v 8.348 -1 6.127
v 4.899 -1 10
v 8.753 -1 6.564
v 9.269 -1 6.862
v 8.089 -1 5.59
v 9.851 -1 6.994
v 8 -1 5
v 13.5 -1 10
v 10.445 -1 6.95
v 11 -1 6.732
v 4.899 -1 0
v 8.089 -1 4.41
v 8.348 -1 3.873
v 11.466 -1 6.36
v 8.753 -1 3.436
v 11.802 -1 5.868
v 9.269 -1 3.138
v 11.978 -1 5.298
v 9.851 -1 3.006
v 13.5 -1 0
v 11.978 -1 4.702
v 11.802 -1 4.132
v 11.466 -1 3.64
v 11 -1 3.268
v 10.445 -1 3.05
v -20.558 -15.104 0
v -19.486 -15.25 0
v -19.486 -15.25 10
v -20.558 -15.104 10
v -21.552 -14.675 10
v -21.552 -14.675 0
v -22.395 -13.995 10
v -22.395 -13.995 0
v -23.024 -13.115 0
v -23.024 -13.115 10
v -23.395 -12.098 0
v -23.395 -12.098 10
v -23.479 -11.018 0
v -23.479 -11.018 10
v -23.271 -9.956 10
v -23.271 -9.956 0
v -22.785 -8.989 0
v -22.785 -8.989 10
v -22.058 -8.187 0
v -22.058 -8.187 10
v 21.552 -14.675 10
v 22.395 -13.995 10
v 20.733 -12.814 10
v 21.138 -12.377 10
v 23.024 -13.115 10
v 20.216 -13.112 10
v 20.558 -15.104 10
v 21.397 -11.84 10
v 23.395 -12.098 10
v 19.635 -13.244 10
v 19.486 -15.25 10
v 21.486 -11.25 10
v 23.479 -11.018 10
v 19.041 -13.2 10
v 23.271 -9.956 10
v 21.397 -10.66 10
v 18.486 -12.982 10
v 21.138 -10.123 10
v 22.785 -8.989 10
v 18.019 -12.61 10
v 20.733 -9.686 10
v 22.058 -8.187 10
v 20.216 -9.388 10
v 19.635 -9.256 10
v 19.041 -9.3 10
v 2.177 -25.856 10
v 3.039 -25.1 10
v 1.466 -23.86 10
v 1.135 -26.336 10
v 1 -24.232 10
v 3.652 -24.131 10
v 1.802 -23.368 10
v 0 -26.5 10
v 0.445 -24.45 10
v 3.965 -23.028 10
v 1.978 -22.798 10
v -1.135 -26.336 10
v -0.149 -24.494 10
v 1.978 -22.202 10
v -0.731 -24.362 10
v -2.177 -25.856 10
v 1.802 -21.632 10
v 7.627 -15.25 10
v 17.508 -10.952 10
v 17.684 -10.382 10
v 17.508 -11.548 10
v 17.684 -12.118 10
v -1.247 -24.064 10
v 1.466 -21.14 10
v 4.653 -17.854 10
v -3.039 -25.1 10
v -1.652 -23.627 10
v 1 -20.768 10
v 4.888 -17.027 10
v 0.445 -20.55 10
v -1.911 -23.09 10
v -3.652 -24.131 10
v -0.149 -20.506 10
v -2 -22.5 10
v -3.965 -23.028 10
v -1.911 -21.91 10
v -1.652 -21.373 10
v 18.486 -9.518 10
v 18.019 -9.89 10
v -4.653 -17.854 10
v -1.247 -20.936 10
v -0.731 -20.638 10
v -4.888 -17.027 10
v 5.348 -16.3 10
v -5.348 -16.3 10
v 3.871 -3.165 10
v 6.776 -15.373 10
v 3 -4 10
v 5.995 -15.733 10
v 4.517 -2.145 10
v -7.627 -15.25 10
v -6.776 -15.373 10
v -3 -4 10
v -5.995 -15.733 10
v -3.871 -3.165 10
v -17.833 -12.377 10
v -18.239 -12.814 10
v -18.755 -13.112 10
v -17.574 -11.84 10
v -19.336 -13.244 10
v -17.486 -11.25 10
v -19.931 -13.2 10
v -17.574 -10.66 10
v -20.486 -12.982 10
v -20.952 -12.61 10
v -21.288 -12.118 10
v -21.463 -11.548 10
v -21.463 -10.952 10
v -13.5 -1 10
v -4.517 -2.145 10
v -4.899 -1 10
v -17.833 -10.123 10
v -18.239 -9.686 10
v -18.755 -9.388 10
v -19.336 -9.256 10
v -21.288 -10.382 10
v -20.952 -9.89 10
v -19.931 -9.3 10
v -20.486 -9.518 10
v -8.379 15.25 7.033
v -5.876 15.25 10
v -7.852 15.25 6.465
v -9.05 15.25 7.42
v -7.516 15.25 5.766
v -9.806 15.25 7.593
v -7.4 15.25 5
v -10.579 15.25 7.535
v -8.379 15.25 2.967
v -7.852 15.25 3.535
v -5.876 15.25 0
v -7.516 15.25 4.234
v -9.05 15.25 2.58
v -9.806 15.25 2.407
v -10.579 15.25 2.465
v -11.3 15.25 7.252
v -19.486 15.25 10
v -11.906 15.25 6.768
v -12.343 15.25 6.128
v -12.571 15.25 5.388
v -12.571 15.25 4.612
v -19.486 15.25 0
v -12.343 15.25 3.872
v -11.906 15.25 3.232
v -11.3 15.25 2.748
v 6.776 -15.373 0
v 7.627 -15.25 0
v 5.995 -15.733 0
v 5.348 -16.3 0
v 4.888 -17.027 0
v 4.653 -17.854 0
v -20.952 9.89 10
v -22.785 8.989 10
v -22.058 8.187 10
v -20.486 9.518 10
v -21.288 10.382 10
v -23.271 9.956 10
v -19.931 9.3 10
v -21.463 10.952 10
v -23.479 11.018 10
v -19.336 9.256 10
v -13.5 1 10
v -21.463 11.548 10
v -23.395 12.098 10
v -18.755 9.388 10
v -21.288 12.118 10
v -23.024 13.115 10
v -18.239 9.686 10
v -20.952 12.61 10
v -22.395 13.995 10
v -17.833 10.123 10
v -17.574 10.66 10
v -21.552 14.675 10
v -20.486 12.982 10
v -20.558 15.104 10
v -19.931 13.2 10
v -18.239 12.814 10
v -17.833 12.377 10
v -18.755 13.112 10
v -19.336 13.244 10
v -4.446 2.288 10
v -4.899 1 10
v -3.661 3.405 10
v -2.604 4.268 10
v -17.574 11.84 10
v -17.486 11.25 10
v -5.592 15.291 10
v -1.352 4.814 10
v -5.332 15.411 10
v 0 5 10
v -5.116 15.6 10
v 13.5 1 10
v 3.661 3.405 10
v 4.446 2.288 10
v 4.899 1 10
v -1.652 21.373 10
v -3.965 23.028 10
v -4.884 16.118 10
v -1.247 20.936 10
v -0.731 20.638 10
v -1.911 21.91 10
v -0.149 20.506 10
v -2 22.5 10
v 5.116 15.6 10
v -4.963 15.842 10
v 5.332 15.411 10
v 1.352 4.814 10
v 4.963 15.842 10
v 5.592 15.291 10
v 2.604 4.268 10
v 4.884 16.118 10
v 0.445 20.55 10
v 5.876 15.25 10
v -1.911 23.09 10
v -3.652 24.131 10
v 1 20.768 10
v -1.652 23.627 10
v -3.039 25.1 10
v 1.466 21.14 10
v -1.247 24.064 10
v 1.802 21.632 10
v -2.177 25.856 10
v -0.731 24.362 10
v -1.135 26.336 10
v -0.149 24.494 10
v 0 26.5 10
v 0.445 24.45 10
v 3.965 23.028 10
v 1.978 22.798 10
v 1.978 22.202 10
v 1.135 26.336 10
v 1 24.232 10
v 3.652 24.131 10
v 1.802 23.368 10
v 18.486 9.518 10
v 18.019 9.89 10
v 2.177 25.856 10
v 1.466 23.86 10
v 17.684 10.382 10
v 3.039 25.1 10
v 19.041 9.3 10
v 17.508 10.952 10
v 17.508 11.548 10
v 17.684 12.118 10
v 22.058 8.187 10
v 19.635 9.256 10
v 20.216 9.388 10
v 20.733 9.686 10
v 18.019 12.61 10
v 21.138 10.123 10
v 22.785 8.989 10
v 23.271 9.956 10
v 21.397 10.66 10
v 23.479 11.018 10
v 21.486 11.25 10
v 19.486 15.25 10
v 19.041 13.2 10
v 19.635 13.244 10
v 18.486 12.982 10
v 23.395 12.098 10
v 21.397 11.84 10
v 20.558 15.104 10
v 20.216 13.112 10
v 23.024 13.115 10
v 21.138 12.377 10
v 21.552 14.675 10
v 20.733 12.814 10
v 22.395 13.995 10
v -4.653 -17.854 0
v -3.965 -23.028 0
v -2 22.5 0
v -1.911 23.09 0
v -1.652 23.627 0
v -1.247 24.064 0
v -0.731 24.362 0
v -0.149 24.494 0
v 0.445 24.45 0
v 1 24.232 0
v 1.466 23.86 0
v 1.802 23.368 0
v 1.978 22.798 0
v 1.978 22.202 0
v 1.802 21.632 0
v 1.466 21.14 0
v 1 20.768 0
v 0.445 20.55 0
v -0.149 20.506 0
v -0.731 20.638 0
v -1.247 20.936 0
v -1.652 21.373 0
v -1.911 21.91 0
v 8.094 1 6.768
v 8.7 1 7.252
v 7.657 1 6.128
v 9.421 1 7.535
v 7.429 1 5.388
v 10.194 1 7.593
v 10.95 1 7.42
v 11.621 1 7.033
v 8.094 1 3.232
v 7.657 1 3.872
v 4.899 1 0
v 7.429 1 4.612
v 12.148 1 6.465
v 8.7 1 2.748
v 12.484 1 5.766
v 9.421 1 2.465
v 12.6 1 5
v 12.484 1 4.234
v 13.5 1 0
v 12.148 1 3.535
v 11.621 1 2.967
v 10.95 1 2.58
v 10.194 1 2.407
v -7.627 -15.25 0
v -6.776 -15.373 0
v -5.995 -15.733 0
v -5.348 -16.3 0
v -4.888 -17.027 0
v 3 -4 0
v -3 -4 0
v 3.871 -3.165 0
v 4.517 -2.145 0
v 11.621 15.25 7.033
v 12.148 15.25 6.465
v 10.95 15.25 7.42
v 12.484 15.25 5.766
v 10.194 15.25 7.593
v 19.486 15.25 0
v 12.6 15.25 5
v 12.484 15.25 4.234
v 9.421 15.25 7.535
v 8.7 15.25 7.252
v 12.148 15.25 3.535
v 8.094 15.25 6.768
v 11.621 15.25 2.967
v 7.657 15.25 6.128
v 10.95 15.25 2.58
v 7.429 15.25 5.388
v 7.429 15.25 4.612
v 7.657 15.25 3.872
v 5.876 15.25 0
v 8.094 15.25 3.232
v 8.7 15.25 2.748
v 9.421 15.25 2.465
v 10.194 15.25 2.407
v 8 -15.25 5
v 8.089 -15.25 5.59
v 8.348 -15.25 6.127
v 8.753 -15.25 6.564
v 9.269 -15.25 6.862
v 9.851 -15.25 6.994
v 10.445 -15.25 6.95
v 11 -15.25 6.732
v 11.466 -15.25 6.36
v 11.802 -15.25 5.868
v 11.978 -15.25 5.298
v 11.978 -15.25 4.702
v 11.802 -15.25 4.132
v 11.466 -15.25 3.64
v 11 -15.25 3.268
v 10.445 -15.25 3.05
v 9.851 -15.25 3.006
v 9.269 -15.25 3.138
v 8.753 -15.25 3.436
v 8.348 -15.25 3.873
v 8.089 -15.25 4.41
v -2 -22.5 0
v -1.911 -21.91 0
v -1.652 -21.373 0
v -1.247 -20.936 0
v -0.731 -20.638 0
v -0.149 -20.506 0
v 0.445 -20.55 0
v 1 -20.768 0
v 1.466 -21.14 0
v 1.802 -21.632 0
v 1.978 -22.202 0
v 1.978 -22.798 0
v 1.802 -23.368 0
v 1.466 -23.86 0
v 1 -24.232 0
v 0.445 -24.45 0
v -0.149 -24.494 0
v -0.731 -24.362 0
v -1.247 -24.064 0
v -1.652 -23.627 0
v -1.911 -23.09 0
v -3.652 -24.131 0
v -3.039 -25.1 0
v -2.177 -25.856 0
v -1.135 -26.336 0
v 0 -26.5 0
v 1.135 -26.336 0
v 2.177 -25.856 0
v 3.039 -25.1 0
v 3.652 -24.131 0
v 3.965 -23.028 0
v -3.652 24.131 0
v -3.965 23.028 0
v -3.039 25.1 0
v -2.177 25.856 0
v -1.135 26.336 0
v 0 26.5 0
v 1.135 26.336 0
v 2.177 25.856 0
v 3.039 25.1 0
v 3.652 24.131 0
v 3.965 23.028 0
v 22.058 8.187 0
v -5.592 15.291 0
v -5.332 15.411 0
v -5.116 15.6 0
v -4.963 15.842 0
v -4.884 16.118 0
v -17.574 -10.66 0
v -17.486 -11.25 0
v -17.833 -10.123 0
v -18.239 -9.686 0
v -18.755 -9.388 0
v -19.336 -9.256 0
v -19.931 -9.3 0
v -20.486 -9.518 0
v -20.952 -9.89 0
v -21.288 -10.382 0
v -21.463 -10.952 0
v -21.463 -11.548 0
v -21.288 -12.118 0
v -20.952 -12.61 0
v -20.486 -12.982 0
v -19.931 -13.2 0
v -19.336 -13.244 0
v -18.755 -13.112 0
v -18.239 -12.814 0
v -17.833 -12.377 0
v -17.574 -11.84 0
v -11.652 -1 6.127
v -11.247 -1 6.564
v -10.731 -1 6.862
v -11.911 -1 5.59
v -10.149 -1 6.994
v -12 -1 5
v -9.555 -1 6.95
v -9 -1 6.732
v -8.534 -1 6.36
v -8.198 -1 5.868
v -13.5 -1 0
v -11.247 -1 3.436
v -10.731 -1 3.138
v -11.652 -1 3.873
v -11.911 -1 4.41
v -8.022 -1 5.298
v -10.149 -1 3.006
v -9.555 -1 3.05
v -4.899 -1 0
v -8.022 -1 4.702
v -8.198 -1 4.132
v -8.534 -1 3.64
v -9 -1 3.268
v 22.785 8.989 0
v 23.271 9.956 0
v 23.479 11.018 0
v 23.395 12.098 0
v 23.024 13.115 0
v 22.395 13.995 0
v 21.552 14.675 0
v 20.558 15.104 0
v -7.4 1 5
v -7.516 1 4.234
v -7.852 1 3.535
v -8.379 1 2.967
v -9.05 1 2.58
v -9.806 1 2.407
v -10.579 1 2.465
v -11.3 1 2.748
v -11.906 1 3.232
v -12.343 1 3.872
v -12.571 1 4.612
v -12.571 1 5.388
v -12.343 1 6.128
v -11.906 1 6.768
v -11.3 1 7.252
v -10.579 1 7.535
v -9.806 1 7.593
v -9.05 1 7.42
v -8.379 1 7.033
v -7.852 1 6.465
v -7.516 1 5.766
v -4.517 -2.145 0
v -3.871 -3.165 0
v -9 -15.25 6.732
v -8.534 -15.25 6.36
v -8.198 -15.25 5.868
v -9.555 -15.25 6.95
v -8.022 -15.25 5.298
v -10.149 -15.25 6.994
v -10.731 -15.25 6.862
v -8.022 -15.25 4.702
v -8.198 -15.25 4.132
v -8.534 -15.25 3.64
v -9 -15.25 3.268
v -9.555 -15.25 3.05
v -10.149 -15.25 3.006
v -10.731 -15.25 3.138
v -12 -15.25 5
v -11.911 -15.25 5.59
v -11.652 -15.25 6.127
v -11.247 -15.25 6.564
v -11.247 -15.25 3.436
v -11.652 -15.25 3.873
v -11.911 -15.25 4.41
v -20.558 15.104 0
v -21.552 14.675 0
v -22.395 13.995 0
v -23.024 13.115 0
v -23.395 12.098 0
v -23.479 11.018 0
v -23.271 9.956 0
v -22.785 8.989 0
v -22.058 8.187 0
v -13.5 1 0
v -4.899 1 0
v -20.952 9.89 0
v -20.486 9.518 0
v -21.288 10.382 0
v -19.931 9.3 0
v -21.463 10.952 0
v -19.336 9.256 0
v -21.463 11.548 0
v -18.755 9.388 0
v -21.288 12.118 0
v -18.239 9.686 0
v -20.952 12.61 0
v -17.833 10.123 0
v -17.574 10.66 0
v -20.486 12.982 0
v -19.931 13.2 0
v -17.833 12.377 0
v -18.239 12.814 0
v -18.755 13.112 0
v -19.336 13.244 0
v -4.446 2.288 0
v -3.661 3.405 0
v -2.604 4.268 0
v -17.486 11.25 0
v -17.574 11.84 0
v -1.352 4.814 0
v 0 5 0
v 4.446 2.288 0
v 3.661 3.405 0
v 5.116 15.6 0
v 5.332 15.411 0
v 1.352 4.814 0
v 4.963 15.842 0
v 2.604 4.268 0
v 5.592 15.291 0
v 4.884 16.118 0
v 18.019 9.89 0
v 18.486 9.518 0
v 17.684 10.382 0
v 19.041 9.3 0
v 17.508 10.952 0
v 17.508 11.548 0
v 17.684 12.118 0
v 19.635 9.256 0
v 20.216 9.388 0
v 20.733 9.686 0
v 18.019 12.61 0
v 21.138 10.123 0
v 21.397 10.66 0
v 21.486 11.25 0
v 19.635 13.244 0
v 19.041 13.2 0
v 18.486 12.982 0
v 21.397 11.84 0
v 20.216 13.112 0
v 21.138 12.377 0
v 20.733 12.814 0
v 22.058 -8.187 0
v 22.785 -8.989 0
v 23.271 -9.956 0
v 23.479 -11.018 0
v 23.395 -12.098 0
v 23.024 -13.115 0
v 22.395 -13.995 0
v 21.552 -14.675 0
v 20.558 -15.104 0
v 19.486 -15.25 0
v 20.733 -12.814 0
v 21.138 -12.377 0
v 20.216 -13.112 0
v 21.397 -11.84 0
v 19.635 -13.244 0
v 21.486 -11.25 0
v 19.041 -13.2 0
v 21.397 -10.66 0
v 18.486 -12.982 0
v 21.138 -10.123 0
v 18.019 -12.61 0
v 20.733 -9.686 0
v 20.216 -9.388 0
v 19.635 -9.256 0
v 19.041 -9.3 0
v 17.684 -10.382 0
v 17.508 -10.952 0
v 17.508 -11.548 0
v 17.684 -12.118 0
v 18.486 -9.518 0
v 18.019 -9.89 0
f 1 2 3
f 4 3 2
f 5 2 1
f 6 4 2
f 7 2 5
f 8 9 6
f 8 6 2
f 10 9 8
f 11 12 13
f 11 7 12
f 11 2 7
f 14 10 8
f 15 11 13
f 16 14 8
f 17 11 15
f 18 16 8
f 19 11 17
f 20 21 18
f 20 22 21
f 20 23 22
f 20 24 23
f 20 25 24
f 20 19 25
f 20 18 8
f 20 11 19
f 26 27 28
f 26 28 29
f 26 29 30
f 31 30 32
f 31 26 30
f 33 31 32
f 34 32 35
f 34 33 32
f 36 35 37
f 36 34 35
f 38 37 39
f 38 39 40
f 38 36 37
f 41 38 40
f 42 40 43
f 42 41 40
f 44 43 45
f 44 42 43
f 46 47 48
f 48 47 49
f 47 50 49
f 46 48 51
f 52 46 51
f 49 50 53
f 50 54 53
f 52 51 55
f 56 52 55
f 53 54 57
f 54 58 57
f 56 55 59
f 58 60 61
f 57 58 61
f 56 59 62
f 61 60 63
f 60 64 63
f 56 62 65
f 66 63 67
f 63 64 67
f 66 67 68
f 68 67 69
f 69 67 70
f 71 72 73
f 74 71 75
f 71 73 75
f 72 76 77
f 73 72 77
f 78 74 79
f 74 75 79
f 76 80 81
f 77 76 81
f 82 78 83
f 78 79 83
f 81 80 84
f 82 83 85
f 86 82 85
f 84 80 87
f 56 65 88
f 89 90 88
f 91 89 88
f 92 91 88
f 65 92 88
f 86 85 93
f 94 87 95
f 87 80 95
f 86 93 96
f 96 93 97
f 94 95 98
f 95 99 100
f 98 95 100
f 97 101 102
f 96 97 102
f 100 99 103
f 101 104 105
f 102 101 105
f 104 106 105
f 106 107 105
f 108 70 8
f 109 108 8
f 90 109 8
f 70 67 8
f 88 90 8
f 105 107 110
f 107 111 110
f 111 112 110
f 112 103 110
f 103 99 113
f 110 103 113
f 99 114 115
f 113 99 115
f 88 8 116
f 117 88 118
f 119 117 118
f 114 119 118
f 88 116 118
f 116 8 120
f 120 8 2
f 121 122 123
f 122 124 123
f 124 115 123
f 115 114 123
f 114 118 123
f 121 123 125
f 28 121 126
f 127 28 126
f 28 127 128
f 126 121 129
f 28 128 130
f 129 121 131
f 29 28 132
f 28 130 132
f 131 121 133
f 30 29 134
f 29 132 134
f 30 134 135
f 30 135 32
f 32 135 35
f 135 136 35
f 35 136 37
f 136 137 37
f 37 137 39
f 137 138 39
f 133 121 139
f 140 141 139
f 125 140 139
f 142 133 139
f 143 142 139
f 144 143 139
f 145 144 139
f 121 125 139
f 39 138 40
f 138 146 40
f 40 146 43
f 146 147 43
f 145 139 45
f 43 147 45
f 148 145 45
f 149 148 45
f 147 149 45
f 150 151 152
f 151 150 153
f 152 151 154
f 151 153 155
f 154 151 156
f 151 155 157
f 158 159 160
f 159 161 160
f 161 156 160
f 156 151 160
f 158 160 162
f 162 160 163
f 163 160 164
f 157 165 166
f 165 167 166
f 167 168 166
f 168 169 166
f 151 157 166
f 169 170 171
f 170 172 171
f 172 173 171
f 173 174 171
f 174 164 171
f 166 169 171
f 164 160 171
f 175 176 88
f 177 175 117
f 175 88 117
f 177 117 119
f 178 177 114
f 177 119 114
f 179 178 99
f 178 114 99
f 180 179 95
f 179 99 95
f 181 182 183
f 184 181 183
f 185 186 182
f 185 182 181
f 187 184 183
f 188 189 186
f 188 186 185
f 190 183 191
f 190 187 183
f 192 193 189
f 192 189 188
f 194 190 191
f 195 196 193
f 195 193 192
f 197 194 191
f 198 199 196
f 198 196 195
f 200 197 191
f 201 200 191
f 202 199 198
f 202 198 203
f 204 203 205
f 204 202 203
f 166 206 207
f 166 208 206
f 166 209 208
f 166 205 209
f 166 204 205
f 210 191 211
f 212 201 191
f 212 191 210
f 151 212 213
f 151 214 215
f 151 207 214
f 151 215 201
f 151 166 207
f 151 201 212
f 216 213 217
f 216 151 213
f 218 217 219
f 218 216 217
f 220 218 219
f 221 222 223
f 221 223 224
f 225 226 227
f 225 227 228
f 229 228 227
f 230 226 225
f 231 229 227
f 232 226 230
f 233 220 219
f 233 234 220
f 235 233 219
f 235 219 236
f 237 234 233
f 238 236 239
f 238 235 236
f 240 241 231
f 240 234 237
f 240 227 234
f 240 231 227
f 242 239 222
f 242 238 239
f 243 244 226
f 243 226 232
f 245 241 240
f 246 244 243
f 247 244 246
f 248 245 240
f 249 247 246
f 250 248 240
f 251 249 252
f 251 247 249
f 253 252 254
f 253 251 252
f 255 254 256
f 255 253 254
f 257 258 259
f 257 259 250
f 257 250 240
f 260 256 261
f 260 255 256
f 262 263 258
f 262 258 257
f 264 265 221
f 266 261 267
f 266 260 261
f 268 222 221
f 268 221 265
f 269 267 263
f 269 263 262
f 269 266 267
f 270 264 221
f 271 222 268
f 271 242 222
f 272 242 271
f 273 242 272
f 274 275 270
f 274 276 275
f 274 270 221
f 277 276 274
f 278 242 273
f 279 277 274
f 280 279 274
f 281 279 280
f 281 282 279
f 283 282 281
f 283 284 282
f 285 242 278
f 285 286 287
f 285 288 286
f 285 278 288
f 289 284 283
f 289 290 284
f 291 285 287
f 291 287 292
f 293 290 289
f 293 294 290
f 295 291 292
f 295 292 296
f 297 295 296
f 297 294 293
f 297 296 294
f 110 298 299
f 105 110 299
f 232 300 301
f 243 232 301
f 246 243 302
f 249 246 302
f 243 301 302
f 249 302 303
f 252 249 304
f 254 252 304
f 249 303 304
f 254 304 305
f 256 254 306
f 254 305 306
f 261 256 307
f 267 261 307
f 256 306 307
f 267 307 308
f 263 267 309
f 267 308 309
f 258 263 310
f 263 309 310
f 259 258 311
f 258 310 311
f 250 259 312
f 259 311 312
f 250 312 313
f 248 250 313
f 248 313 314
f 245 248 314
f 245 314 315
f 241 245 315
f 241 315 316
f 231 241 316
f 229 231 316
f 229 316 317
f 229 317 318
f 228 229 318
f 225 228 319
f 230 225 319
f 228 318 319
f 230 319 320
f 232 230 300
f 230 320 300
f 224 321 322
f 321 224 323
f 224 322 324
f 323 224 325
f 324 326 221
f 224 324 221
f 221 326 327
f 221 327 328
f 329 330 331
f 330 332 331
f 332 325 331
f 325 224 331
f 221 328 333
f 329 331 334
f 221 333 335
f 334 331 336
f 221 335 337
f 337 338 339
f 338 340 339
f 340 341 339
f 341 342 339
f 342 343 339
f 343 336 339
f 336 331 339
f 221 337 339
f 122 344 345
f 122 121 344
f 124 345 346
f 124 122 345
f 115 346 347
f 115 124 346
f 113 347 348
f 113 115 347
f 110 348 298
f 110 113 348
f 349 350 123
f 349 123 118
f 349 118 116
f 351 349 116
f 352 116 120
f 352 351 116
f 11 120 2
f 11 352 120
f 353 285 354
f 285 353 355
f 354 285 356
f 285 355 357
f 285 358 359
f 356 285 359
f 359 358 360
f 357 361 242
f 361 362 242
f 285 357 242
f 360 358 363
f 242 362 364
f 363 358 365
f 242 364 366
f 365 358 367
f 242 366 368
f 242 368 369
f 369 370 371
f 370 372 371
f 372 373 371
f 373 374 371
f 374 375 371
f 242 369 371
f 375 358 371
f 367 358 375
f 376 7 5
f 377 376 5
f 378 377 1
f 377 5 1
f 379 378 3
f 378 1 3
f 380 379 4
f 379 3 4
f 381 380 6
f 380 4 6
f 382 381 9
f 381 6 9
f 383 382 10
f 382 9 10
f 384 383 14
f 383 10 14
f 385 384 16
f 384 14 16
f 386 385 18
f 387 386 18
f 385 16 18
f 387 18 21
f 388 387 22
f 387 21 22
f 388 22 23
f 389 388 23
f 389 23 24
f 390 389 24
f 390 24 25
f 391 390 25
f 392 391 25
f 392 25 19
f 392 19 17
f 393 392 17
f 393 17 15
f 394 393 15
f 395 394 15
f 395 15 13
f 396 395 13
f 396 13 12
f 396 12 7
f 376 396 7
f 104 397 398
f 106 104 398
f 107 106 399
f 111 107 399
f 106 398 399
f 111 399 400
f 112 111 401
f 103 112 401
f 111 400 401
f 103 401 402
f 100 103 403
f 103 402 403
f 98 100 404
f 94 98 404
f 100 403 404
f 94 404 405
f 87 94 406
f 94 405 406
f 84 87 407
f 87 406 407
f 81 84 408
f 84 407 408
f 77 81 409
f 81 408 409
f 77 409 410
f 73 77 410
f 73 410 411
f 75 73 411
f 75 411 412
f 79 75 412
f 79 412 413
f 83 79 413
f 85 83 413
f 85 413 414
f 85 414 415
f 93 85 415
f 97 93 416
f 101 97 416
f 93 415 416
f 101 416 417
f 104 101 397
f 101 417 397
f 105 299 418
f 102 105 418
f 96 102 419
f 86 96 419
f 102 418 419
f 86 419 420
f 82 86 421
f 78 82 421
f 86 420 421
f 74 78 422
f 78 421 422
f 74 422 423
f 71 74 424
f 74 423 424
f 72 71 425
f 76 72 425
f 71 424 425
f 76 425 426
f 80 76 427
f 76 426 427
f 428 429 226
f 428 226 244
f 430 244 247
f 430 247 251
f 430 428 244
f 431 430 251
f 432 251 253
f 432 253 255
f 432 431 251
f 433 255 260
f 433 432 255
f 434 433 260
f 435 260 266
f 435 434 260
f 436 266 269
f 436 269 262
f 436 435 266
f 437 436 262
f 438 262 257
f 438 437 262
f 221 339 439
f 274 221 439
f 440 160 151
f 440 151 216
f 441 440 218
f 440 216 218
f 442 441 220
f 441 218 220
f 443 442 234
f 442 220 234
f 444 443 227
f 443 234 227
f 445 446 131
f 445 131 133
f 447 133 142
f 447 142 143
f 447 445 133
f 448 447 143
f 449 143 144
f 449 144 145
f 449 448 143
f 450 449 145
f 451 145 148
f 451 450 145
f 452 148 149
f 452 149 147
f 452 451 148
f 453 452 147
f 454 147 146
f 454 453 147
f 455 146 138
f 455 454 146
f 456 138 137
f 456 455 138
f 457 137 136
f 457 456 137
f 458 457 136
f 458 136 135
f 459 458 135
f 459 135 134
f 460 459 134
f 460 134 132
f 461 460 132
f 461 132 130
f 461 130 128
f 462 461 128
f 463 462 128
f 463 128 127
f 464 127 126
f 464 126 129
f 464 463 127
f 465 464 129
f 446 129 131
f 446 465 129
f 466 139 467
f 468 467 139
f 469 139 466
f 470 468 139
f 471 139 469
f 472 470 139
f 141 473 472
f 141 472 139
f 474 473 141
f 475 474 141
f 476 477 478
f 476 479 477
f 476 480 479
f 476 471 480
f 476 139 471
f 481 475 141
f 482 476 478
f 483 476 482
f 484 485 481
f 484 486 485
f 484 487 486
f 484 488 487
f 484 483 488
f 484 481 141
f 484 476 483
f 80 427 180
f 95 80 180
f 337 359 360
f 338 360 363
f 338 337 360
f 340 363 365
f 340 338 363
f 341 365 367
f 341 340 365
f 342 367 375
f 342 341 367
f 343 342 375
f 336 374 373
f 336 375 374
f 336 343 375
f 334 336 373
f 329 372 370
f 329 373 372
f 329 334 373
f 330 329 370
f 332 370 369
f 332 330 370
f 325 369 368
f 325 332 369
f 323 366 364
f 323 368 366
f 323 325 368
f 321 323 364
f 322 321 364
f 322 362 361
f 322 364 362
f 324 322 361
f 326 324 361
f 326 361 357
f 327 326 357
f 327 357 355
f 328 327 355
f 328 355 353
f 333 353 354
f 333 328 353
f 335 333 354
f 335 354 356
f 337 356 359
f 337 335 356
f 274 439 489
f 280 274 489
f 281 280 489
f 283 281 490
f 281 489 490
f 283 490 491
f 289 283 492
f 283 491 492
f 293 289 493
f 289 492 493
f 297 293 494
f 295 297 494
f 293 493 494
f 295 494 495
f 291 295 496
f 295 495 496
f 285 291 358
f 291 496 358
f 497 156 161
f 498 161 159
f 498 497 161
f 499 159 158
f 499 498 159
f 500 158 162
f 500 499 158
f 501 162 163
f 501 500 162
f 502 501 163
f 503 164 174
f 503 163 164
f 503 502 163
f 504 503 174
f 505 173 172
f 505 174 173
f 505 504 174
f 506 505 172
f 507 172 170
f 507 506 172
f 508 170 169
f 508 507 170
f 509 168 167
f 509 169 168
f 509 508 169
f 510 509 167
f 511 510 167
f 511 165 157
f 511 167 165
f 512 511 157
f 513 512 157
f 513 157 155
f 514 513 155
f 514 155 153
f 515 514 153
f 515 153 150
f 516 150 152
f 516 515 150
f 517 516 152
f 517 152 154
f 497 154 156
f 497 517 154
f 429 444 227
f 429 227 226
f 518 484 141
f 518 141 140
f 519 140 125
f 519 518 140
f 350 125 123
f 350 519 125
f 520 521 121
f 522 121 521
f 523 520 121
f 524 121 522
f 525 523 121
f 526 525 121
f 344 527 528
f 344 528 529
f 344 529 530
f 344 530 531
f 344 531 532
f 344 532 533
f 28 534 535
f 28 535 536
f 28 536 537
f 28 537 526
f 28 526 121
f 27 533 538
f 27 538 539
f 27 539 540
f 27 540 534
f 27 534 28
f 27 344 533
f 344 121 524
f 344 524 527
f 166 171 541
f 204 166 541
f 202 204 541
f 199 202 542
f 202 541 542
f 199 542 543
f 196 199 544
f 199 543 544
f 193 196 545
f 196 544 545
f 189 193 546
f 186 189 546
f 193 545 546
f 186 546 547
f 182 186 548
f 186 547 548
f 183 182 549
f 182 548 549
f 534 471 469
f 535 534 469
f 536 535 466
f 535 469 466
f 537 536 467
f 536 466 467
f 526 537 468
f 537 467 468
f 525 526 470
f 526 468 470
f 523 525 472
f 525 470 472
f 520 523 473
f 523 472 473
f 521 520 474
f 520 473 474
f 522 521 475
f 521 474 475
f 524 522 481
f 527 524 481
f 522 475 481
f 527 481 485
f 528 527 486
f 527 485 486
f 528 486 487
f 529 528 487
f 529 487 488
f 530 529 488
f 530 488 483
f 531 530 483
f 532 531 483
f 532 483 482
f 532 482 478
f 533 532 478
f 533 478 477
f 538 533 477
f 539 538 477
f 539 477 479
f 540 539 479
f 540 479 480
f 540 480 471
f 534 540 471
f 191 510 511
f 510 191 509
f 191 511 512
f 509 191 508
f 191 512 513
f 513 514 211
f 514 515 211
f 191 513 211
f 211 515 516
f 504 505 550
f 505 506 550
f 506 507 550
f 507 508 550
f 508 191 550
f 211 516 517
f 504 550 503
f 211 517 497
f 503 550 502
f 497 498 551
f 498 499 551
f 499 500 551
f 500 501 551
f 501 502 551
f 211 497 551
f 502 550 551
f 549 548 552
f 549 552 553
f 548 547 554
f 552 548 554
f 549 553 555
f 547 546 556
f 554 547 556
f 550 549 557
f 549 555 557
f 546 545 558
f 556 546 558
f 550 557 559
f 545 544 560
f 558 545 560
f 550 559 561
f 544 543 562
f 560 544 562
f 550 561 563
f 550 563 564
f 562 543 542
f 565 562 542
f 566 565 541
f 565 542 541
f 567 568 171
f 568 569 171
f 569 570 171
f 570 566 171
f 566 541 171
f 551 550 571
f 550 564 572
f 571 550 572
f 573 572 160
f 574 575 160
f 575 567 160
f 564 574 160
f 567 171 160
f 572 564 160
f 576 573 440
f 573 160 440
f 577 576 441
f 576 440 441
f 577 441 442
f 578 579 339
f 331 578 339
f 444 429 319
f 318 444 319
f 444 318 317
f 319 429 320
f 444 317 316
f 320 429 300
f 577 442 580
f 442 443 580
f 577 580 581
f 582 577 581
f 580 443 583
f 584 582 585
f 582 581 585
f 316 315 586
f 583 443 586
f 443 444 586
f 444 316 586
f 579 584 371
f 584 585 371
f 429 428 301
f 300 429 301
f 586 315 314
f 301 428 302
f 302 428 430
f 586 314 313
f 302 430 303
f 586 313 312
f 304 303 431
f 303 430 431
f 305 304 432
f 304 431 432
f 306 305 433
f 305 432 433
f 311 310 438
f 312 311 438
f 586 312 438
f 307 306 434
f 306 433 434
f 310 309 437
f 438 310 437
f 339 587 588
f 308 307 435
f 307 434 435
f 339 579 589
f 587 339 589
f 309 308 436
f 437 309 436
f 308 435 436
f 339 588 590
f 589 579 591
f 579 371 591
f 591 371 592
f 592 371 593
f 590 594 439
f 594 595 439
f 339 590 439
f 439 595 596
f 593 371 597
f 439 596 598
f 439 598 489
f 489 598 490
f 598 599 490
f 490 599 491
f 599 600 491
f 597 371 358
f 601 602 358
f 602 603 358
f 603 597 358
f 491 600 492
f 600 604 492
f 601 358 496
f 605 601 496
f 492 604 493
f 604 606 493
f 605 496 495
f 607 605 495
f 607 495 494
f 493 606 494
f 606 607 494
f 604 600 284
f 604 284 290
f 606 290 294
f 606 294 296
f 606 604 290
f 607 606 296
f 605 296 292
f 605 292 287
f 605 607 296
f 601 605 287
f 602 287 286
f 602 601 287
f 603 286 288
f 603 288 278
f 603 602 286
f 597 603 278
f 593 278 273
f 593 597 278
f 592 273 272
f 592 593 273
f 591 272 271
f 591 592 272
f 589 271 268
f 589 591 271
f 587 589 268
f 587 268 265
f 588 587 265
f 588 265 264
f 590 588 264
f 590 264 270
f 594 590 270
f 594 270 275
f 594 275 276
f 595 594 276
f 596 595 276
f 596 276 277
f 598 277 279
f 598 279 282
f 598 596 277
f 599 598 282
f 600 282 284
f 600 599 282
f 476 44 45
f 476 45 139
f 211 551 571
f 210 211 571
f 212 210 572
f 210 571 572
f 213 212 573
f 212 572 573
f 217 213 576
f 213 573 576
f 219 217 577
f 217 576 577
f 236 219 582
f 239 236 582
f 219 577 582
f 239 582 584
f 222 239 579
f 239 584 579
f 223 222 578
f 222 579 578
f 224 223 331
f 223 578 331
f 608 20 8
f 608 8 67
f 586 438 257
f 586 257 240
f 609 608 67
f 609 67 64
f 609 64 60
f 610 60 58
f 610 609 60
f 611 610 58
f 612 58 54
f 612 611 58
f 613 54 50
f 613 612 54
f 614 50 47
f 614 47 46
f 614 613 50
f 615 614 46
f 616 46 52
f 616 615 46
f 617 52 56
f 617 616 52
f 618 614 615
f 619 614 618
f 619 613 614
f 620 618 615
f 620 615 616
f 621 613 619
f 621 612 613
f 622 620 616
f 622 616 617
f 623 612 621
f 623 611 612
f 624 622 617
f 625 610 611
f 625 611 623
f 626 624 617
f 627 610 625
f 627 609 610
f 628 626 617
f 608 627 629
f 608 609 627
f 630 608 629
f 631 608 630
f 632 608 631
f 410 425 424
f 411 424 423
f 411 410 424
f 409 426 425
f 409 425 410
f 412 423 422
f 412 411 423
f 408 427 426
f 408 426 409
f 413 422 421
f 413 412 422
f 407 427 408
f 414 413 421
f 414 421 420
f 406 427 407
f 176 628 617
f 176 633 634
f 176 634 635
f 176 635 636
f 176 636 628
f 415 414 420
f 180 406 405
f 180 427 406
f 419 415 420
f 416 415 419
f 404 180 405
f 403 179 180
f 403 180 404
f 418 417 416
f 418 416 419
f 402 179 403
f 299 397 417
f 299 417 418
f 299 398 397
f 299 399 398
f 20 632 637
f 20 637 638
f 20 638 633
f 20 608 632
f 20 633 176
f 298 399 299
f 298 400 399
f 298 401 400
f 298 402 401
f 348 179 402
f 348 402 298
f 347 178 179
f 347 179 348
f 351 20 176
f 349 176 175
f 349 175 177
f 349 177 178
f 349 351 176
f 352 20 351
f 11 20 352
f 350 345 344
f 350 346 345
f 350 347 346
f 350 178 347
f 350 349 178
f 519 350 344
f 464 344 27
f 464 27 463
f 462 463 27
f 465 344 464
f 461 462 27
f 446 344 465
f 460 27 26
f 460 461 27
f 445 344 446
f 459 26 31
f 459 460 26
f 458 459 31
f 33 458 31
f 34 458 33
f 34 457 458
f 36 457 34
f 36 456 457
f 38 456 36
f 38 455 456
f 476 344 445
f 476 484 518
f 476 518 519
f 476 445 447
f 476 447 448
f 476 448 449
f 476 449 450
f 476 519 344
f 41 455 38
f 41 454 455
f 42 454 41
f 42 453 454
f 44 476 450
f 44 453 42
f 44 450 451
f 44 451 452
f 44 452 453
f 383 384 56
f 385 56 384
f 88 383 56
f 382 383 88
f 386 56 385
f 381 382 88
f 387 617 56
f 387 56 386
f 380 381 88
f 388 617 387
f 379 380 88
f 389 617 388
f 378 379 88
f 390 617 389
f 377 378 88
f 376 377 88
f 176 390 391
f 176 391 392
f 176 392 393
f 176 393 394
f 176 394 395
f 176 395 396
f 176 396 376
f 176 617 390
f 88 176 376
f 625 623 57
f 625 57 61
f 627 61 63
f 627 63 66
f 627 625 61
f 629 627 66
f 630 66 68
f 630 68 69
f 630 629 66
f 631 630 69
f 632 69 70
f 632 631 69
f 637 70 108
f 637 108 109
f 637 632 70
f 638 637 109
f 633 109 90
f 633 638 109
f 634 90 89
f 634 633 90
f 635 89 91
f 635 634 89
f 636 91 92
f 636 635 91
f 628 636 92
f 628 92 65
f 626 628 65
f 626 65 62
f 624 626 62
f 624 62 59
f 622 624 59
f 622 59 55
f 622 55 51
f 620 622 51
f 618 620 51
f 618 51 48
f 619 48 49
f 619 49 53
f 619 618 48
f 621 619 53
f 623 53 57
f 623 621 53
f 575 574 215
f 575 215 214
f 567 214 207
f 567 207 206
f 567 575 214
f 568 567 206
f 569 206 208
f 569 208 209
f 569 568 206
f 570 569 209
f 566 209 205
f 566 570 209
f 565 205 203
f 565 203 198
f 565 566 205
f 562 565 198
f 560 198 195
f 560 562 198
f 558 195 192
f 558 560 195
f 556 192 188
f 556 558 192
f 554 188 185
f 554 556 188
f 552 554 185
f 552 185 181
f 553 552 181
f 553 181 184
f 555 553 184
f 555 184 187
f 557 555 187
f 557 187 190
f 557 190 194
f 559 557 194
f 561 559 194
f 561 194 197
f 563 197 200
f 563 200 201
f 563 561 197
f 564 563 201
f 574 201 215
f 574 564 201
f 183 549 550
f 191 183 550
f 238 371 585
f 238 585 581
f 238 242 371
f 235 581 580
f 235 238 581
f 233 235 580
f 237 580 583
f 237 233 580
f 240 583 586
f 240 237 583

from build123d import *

# Parameters (mm, degrees)
SKETCH_1_R               = 2
EXTRUDE_1_DEPTH          = 10
EXTRUDE_1_2_DEPTH        = 10
CUT_EXTRUDE_2_DEPTH      = 40.772126831
CUT_EXTRUDE_2_DEPTH_BACK = 14.25
SKETCH_3_R               = 2.6
SKETCH_4_R               = 2
CUT_EXTRUDE_3_DEPTH      = 40.772126831
SKETCH_5_R               = 2
EXTRUDE_2_DEPTH          = 10
FILLET_1_R               = 3
FILLET_2_R               = 1


with BuildPart() as part:
    # 草图1 → 凸台-拉伸1 (new body)
    with BuildSketch(Plane.XY):
        with BuildLine():
            Line((-3, -4), (3, -4))
            ThreePointArc((3, -4), (4.224744871, -2.674234614), (4.898979486, -1))
            Line((4.898979486, -1), (13.5, -1))
            Line((13.5, -1), (22.057956933, -8.186858864))
            ThreePointArc((22.057956933, -8.186858864), (23.244066267, -12.618838094), (19.485571585, -15.25))
            Line((19.485571585, -15.25), (-19.485571585, -15.25))
            ThreePointArc((-19.485571585, -15.25), (-23.244066267, -12.618838094), (-22.057956933, -8.186858864))
            Line((-22.057956933, -8.186858864), (-13.5, -1))
            Line((-13.5, -1), (-4.898979486, -1))
            ThreePointArc((-4.898979486, -1), (-4.224744871, -2.674234614), (-3, -4))
        make_face()
        with Locations((19.485571585, -11.25)):
            Circle(SKETCH_1_R, mode=Mode.SUBTRACT)
        with Locations((-19.485571585, -11.25)):
            Circle(SKETCH_1_R, mode=Mode.SUBTRACT)
    extrude(amount=EXTRUDE_1_DEPTH)

    # 草图4 → 切除-拉伸3 (cut, through all)
    with BuildSketch(Plane(origin=(0, 15.25, 0), x_dir=(1, 0, 0), z_dir=(0, 1, 0))):
        with Locations(Location((10, -5, 0), (0, 0, 180))):
            Circle(SKETCH_4_R)
        with Locations(Location((-10, -5, 0), (0, 0, 180))):
            Circle(SKETCH_4_R)
    extrude(amount=-CUT_EXTRUDE_3_DEPTH, mode=Mode.SUBTRACT)



with BuildPart() as body_2:
    # 草图1 → Extrude 1 2 (new body)
    with BuildSketch(Plane.XY):
        with BuildLine():
            Line((-13.5, 1), (-4.898979486, 1))
            ThreePointArc((-4.898979486, 1), (0, 5), (4.898979486, 1))
            Line((4.898979486, 1), (13.5, 1))
            Line((13.5, 1), (22.057956933, 8.186858864))
            ThreePointArc((22.057956933, 8.186858864), (23.244066267, 12.618838094), (19.485571585, 15.25))
            Line((19.485571585, 15.25), (-19.485571585, 15.25))
            ThreePointArc((-19.485571585, 15.25), (-23.244066267, 12.618838094), (-22.057956933, 8.186858864))
            Line((-22.057956933, 8.186858864), (-13.5, 1))
        make_face()
        with Locations((19.485571585, 11.25)):
            Circle(SKETCH_1_R, mode=Mode.SUBTRACT)
        with Locations((-19.485571585, 11.25)):
            Circle(SKETCH_1_R, mode=Mode.SUBTRACT)
    extrude(amount=EXTRUDE_1_2_DEPTH)

    # 草图3 → 切除-拉伸2 (cut, two sides: drawn at the far end of the back side and taken through both)
    with BuildSketch(Plane(origin=(0, 15.25, 0), x_dir=(1, 0, 0), z_dir=(0, 1, 0)).offset(-CUT_EXTRUDE_2_DEPTH_BACK)):
        with Locations((10, -5)):
            Circle(SKETCH_3_R)
        with Locations((-10, -5)):
            Circle(SKETCH_3_R)
    extrude(amount=CUT_EXTRUDE_2_DEPTH + CUT_EXTRUDE_2_DEPTH_BACK, mode=Mode.SUBTRACT)


with BuildPart() as part_1:
    add(part.part)

    add(body_2.part)  # 凸台-拉伸2 merges body 2
    # 草图5 → 凸台-拉伸2 (add)
    # profile 1 of 2: a face of its own
    with BuildSketch(Plane(origin=(0, 0, 0), x_dir=(-1, 0, 0), z_dir=(0, 0, -1))):
        with BuildLine():
            Line((-3.965049412, -23.027620284), (-5, -15.25))
            Line((-5, -15.25), (5, -15.25))
            Line((5, -15.25), (3.965049412, -23.027620284))
            ThreePointArc((3.965049412, -23.027620284), (0, -26.5), (-3.965049412, -23.027620284))
        make_face()
        with Locations((0, -22.5)):
            Circle(SKETCH_5_R, mode=Mode.SUBTRACT)
    # profile 2 of 2: a face of its own
    with BuildSketch(Plane(origin=(0, 0, 0), x_dir=(-1, 0, 0), z_dir=(0, 0, -1))):
        with BuildLine():
            Line((5, 15.25), (3.965049412, 23.027620284))
            ThreePointArc((3.965049412, 23.027620284), (0, 26.5), (-3.965049412, 23.027620284))
            Line((-3.965049412, 23.027620284), (-5, 15.25))
            Line((-5, 15.25), (5, 15.25))
        make_face()
        with Locations((0, 22.5)):
            Circle(SKETCH_5_R, mode=Mode.SUBTRACT)
    extrude(amount=-EXTRUDE_2_DEPTH)

    # 圆角1
    fillet_1_edges = [part_1.edges().sort_by_distance(p)[0] for p in [
        (-5, -15.25, 5),
        (5, -15.25, 5),
    ]]
    fillet(fillet_1_edges, radius=FILLET_1_R)

    # 圆角2
    fillet_2_edges = [part_1.edges().sort_by_distance(p)[0] for p in [
        (5, 15.25, 5),
        (-5, 15.25, 5),
    ]]
    fillet(fillet_2_edges, radius=FILLET_2_R)


solid = part_1.part
